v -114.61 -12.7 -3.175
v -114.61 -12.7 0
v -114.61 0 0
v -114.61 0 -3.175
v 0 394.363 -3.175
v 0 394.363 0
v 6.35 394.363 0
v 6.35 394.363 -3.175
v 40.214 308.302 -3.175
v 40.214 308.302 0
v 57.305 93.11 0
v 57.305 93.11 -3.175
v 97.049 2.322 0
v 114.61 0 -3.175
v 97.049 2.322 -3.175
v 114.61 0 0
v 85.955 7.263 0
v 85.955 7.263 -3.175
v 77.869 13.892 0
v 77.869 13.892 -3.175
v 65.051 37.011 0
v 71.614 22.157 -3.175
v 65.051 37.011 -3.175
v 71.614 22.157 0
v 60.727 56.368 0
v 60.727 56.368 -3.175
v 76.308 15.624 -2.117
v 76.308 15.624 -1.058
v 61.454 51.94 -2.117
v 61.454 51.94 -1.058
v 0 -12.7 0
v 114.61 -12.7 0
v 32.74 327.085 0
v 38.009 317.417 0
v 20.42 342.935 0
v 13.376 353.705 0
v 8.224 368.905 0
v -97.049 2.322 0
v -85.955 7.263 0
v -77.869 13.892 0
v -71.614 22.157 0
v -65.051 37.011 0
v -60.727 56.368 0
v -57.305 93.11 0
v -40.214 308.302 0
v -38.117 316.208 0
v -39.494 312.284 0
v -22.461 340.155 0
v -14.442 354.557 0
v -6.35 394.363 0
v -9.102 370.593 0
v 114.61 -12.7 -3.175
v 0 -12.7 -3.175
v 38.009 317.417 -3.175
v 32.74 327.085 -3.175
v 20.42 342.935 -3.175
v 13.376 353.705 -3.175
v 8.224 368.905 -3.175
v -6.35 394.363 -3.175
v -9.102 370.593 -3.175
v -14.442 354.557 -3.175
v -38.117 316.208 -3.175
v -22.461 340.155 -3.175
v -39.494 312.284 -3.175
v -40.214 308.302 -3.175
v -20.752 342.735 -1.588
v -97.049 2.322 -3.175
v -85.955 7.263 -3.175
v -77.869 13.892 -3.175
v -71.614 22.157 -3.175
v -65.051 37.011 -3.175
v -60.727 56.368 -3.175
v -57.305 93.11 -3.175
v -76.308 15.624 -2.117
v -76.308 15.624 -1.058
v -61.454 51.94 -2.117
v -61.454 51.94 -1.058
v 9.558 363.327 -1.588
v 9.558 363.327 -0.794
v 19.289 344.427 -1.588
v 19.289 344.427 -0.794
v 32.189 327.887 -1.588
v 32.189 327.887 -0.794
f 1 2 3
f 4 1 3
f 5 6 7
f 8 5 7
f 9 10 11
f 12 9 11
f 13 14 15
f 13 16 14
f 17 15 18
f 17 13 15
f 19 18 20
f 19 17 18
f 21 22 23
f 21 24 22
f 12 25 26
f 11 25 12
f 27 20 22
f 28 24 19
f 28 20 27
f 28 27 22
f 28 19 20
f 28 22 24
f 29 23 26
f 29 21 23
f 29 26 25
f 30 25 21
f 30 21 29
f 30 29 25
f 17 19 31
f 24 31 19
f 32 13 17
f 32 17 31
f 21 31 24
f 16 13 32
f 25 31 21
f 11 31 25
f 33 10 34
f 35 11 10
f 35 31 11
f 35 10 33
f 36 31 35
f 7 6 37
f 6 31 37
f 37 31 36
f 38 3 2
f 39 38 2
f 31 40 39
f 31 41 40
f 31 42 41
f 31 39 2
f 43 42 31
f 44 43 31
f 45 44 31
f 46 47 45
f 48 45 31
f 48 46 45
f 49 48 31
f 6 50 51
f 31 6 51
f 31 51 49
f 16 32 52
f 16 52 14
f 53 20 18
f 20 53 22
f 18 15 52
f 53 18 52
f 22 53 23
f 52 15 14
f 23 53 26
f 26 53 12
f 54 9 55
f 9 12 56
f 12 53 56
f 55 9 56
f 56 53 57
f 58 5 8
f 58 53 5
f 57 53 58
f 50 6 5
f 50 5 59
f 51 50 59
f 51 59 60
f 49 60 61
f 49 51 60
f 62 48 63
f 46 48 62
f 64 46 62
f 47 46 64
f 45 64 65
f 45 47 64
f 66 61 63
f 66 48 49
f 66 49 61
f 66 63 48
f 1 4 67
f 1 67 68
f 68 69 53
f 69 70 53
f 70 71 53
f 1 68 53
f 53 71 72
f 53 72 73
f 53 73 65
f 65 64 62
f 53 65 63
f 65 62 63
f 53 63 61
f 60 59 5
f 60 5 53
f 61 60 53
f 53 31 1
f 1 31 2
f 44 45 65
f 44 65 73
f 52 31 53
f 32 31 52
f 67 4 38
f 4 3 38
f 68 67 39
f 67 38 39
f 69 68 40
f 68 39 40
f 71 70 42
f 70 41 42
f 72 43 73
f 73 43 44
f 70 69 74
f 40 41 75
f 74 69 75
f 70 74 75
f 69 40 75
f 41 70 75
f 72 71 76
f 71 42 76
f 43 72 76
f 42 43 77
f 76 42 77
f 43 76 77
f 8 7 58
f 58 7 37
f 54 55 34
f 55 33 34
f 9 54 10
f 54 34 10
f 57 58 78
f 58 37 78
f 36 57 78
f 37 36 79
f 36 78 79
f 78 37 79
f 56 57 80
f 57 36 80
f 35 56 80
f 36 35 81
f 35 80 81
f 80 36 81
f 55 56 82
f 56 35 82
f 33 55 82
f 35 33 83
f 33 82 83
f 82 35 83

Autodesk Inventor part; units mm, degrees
ref_plane "YZ Plane" through (0, 0, 0) normal (1, 0, 0) x (0, 1, 0)
ref_plane "XZ Plane" through (0, 0, 0) normal (0, 1, 0) x (-1, 0, 0)
ref_plane "XY Plane" through (0, 0, 0) normal (0, 0, 1) x (1, 0, 0)
sketch "Sketch1" plane through (0, 0, 0) normal (0, 0, 1) x (1, 0, 0)
  line L0 (76.2, -12.7) -> (381, -12.7) construction
  line L1 (-76.2, -12.7) -> (-381, -12.7) construction
  line L2 (-76.2, 0) -> (-381, 0) construction
  line L3 (76.2, 0) -> (381, 0) construction
  line L4 (0, -116.2267) -> (0, 608.4603)
  line L5 (0, -12.7) -> (-114.6099, -12.7)
  line L6 (-114.6099, -12.7) -> (-114.6099, 0)
  line L7 (0, 394.3626) -> (-6.35, 394.3626)
  line L8 (-40.2136, 308.3016) -> (-57.305, 93.11)
  spline S0 degree 3 poles (-114.6099, 0) (-60.3377, 0) (-60.3484, 54.7909) (-57.305, 93.11) knots 0 0 0 0 1 1 1 1
  line L9 (-119.6474, 0) -> (-109.5725, 0) construction
  arc A0 (-118.6349, 0.1005) -> (-110.585, 0.1005) centre (-114.6099, 80.6377) ccw construction
  line L10 (40.2136, 308.3016) -> (57.305, 93.11)
  line L11 (0, 394.3626) -> (6.35, 394.3626)
  spline S1 degree 3 poles (114.6099, 0) (60.3377, 0) (60.3484, 54.7909) (57.305, 93.11) knots 0 0 0 0 1 1 1 1
  line L12 (119.6474, 0) -> (109.5725, 0) construction
  arc A1 (110.585, 0.1005) -> (118.6349, 0.1005) centre (114.6099, 80.6377) ccw construction
  line L13 (0, -12.7) -> (114.6099, -12.7)
  line L14 (114.6099, -12.7) -> (114.6099, 0)
  spline S2 degree 4 poles (-6.35, 394.3626) (-6.35, 372.6715) (-17.579, 345.2739) (-20.8089, 340.9314) (-39.3875, 318.7028) (-40.2136, 308.3016) knots 0 0 0 0 0 0.523271 1 1 1 1 1
  line L15 (-6.35, 421.2444) -> (-6.35, 367.4808) construction
  arc A2 (-8.4521, 373.2806) -> (-8.4521, 415.4446) centre (-113.1163, 394.3626) ccw construction
  spline S3 degree 4 poles (6.35, 394.3626) (6.35, 352.9097) (13.7895, 346.0085) (38.4808, 330.1195) (40.2136, 308.3016) knots 0 0 0 0 0 1 1 1 1 1
  line L16 (6.35, 421.2444) -> (6.35, 367.4808) construction
  arc A3 (8.4521, 415.4446) -> (8.4521, 373.2806) centre (113.1163, 394.3626) ccw construction
  line L17 (-14.8603, 351.5845) -> (-28.3954, 331.1958) construction
  arc A4 (-27.429, 333.5531) -> (-16.6575, 349.7787) centre (-101.0508, 394.1155) ccw construction
  point P0 (0, 0)
  point P1 (-21.6278, 341.3901)
  point P2 (21.6278, 341.3901)
  dimension "d0" = 6.35
extrude "Extrusion1" add sketch "Sketch1" against normal blind 3.175
properties part number "Bottom Plate v1" material "Wood (Cherry)"
